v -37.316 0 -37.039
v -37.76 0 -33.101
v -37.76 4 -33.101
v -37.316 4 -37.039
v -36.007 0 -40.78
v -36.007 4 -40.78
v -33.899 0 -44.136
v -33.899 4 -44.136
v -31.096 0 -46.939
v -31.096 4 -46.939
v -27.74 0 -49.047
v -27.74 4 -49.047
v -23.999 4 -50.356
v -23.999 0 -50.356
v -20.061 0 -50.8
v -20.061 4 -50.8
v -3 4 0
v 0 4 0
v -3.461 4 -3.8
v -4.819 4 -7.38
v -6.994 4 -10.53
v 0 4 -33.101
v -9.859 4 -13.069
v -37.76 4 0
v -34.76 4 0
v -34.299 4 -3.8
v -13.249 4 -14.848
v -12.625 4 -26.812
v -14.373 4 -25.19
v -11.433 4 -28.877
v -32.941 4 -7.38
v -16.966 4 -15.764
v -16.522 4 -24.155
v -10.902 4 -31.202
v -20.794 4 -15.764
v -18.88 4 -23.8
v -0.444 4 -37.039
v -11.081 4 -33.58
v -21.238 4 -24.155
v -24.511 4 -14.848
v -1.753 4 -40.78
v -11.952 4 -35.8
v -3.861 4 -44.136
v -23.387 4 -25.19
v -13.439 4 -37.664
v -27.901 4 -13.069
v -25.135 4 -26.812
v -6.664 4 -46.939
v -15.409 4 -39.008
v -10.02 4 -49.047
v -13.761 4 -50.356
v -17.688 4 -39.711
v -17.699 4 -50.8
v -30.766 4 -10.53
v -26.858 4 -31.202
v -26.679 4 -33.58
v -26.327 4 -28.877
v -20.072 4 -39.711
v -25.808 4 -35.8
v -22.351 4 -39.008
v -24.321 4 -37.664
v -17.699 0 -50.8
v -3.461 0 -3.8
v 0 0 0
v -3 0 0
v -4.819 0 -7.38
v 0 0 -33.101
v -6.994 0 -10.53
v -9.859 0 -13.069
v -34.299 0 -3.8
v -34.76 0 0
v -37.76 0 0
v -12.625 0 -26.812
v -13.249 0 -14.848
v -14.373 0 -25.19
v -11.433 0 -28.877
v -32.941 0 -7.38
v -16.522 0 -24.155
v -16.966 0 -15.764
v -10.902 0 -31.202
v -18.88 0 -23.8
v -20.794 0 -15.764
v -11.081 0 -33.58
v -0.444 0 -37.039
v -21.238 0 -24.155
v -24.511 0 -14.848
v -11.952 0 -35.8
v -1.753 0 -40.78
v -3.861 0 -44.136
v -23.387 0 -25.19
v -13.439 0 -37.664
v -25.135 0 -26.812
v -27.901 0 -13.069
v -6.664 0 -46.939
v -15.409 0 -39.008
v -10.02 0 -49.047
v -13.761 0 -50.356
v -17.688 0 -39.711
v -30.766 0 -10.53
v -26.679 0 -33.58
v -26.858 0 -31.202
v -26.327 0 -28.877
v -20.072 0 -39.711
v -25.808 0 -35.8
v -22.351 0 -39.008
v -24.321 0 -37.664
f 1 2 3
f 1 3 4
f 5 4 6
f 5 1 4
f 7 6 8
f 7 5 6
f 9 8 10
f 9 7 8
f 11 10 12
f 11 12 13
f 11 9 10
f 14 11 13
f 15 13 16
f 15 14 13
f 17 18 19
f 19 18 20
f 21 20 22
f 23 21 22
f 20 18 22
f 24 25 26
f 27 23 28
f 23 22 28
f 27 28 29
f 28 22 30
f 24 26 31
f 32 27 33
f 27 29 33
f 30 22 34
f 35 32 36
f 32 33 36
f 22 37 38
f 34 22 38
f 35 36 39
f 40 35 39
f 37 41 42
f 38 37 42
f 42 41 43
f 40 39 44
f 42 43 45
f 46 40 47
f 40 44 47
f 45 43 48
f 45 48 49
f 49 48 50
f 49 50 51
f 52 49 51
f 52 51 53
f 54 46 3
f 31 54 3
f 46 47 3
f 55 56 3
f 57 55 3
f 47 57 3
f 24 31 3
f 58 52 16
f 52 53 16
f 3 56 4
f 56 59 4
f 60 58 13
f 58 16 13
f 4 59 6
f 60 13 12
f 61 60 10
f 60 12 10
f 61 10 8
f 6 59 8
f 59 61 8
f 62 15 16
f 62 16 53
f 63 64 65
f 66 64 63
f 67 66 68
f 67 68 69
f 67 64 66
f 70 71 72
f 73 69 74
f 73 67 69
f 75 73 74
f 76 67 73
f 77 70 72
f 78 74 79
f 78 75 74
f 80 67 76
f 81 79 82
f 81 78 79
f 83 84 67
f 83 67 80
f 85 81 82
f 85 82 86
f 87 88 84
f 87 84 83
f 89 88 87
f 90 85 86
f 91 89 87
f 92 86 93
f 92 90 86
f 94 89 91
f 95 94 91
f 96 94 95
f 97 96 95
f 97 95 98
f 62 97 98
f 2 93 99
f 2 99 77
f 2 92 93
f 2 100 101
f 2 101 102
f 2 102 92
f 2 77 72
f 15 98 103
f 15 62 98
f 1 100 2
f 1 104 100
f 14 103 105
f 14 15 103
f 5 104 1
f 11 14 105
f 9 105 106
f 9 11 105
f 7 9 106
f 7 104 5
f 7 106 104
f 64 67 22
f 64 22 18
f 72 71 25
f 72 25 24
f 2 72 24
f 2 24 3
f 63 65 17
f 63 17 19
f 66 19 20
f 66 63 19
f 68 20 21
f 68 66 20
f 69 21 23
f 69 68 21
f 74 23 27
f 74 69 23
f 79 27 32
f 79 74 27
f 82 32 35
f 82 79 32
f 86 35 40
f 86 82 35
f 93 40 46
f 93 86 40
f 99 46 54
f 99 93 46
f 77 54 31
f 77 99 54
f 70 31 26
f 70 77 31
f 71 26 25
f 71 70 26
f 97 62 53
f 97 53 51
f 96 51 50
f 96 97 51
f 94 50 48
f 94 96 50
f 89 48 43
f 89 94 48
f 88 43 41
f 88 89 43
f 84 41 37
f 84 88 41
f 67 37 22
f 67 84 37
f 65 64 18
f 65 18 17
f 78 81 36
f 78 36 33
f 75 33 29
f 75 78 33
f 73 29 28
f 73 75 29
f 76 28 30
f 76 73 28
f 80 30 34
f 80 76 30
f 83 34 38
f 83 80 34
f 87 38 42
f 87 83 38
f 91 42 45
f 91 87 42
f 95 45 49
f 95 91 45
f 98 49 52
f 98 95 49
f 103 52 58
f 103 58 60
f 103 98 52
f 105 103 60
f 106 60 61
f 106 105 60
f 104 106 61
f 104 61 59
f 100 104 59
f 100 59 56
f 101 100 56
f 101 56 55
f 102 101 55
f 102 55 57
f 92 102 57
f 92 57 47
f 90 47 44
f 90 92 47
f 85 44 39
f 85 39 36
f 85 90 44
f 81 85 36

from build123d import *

# Parameters (mm, degrees)
SKETCH1_R           = 8
BOSS_EXTRUDE1_DEPTH = 4


with BuildPart() as part:
    # Sketch1 → Boss-Extrude1 (new body)
    with BuildSketch(Plane(origin=(0, 0, 0), x_dir=(1, 0, 0), z_dir=(0, 1, 0))):
        with BuildLine():
            Line((0, 0), (-3, 0))
            ThreePointArc((-3, 0), (-18.88, 15.88), (-34.76, 0))
            Line((-34.76, 0), (-37.76, 0))
            Line((-37.76, 0), (-37.76, 33.101))
            ThreePointArc((-37.76, 33.101), (-32.57608292, 45.61608292), (-20.061, 50.8))
            Line((-20.061, 50.8), (-17.699, 50.8))
            ThreePointArc((-17.699, 50.8), (-5.18391708, 45.61608292), (0, 33.101))
            Line((0, 33.101), (0, 0))
        make_face()
        with Locations((-18.88, 31.8)):
            Circle(SKETCH1_R, mode=Mode.SUBTRACT)
    extrude(amount=BOSS_EXTRUDE1_DEPTH)


solid = part.part
